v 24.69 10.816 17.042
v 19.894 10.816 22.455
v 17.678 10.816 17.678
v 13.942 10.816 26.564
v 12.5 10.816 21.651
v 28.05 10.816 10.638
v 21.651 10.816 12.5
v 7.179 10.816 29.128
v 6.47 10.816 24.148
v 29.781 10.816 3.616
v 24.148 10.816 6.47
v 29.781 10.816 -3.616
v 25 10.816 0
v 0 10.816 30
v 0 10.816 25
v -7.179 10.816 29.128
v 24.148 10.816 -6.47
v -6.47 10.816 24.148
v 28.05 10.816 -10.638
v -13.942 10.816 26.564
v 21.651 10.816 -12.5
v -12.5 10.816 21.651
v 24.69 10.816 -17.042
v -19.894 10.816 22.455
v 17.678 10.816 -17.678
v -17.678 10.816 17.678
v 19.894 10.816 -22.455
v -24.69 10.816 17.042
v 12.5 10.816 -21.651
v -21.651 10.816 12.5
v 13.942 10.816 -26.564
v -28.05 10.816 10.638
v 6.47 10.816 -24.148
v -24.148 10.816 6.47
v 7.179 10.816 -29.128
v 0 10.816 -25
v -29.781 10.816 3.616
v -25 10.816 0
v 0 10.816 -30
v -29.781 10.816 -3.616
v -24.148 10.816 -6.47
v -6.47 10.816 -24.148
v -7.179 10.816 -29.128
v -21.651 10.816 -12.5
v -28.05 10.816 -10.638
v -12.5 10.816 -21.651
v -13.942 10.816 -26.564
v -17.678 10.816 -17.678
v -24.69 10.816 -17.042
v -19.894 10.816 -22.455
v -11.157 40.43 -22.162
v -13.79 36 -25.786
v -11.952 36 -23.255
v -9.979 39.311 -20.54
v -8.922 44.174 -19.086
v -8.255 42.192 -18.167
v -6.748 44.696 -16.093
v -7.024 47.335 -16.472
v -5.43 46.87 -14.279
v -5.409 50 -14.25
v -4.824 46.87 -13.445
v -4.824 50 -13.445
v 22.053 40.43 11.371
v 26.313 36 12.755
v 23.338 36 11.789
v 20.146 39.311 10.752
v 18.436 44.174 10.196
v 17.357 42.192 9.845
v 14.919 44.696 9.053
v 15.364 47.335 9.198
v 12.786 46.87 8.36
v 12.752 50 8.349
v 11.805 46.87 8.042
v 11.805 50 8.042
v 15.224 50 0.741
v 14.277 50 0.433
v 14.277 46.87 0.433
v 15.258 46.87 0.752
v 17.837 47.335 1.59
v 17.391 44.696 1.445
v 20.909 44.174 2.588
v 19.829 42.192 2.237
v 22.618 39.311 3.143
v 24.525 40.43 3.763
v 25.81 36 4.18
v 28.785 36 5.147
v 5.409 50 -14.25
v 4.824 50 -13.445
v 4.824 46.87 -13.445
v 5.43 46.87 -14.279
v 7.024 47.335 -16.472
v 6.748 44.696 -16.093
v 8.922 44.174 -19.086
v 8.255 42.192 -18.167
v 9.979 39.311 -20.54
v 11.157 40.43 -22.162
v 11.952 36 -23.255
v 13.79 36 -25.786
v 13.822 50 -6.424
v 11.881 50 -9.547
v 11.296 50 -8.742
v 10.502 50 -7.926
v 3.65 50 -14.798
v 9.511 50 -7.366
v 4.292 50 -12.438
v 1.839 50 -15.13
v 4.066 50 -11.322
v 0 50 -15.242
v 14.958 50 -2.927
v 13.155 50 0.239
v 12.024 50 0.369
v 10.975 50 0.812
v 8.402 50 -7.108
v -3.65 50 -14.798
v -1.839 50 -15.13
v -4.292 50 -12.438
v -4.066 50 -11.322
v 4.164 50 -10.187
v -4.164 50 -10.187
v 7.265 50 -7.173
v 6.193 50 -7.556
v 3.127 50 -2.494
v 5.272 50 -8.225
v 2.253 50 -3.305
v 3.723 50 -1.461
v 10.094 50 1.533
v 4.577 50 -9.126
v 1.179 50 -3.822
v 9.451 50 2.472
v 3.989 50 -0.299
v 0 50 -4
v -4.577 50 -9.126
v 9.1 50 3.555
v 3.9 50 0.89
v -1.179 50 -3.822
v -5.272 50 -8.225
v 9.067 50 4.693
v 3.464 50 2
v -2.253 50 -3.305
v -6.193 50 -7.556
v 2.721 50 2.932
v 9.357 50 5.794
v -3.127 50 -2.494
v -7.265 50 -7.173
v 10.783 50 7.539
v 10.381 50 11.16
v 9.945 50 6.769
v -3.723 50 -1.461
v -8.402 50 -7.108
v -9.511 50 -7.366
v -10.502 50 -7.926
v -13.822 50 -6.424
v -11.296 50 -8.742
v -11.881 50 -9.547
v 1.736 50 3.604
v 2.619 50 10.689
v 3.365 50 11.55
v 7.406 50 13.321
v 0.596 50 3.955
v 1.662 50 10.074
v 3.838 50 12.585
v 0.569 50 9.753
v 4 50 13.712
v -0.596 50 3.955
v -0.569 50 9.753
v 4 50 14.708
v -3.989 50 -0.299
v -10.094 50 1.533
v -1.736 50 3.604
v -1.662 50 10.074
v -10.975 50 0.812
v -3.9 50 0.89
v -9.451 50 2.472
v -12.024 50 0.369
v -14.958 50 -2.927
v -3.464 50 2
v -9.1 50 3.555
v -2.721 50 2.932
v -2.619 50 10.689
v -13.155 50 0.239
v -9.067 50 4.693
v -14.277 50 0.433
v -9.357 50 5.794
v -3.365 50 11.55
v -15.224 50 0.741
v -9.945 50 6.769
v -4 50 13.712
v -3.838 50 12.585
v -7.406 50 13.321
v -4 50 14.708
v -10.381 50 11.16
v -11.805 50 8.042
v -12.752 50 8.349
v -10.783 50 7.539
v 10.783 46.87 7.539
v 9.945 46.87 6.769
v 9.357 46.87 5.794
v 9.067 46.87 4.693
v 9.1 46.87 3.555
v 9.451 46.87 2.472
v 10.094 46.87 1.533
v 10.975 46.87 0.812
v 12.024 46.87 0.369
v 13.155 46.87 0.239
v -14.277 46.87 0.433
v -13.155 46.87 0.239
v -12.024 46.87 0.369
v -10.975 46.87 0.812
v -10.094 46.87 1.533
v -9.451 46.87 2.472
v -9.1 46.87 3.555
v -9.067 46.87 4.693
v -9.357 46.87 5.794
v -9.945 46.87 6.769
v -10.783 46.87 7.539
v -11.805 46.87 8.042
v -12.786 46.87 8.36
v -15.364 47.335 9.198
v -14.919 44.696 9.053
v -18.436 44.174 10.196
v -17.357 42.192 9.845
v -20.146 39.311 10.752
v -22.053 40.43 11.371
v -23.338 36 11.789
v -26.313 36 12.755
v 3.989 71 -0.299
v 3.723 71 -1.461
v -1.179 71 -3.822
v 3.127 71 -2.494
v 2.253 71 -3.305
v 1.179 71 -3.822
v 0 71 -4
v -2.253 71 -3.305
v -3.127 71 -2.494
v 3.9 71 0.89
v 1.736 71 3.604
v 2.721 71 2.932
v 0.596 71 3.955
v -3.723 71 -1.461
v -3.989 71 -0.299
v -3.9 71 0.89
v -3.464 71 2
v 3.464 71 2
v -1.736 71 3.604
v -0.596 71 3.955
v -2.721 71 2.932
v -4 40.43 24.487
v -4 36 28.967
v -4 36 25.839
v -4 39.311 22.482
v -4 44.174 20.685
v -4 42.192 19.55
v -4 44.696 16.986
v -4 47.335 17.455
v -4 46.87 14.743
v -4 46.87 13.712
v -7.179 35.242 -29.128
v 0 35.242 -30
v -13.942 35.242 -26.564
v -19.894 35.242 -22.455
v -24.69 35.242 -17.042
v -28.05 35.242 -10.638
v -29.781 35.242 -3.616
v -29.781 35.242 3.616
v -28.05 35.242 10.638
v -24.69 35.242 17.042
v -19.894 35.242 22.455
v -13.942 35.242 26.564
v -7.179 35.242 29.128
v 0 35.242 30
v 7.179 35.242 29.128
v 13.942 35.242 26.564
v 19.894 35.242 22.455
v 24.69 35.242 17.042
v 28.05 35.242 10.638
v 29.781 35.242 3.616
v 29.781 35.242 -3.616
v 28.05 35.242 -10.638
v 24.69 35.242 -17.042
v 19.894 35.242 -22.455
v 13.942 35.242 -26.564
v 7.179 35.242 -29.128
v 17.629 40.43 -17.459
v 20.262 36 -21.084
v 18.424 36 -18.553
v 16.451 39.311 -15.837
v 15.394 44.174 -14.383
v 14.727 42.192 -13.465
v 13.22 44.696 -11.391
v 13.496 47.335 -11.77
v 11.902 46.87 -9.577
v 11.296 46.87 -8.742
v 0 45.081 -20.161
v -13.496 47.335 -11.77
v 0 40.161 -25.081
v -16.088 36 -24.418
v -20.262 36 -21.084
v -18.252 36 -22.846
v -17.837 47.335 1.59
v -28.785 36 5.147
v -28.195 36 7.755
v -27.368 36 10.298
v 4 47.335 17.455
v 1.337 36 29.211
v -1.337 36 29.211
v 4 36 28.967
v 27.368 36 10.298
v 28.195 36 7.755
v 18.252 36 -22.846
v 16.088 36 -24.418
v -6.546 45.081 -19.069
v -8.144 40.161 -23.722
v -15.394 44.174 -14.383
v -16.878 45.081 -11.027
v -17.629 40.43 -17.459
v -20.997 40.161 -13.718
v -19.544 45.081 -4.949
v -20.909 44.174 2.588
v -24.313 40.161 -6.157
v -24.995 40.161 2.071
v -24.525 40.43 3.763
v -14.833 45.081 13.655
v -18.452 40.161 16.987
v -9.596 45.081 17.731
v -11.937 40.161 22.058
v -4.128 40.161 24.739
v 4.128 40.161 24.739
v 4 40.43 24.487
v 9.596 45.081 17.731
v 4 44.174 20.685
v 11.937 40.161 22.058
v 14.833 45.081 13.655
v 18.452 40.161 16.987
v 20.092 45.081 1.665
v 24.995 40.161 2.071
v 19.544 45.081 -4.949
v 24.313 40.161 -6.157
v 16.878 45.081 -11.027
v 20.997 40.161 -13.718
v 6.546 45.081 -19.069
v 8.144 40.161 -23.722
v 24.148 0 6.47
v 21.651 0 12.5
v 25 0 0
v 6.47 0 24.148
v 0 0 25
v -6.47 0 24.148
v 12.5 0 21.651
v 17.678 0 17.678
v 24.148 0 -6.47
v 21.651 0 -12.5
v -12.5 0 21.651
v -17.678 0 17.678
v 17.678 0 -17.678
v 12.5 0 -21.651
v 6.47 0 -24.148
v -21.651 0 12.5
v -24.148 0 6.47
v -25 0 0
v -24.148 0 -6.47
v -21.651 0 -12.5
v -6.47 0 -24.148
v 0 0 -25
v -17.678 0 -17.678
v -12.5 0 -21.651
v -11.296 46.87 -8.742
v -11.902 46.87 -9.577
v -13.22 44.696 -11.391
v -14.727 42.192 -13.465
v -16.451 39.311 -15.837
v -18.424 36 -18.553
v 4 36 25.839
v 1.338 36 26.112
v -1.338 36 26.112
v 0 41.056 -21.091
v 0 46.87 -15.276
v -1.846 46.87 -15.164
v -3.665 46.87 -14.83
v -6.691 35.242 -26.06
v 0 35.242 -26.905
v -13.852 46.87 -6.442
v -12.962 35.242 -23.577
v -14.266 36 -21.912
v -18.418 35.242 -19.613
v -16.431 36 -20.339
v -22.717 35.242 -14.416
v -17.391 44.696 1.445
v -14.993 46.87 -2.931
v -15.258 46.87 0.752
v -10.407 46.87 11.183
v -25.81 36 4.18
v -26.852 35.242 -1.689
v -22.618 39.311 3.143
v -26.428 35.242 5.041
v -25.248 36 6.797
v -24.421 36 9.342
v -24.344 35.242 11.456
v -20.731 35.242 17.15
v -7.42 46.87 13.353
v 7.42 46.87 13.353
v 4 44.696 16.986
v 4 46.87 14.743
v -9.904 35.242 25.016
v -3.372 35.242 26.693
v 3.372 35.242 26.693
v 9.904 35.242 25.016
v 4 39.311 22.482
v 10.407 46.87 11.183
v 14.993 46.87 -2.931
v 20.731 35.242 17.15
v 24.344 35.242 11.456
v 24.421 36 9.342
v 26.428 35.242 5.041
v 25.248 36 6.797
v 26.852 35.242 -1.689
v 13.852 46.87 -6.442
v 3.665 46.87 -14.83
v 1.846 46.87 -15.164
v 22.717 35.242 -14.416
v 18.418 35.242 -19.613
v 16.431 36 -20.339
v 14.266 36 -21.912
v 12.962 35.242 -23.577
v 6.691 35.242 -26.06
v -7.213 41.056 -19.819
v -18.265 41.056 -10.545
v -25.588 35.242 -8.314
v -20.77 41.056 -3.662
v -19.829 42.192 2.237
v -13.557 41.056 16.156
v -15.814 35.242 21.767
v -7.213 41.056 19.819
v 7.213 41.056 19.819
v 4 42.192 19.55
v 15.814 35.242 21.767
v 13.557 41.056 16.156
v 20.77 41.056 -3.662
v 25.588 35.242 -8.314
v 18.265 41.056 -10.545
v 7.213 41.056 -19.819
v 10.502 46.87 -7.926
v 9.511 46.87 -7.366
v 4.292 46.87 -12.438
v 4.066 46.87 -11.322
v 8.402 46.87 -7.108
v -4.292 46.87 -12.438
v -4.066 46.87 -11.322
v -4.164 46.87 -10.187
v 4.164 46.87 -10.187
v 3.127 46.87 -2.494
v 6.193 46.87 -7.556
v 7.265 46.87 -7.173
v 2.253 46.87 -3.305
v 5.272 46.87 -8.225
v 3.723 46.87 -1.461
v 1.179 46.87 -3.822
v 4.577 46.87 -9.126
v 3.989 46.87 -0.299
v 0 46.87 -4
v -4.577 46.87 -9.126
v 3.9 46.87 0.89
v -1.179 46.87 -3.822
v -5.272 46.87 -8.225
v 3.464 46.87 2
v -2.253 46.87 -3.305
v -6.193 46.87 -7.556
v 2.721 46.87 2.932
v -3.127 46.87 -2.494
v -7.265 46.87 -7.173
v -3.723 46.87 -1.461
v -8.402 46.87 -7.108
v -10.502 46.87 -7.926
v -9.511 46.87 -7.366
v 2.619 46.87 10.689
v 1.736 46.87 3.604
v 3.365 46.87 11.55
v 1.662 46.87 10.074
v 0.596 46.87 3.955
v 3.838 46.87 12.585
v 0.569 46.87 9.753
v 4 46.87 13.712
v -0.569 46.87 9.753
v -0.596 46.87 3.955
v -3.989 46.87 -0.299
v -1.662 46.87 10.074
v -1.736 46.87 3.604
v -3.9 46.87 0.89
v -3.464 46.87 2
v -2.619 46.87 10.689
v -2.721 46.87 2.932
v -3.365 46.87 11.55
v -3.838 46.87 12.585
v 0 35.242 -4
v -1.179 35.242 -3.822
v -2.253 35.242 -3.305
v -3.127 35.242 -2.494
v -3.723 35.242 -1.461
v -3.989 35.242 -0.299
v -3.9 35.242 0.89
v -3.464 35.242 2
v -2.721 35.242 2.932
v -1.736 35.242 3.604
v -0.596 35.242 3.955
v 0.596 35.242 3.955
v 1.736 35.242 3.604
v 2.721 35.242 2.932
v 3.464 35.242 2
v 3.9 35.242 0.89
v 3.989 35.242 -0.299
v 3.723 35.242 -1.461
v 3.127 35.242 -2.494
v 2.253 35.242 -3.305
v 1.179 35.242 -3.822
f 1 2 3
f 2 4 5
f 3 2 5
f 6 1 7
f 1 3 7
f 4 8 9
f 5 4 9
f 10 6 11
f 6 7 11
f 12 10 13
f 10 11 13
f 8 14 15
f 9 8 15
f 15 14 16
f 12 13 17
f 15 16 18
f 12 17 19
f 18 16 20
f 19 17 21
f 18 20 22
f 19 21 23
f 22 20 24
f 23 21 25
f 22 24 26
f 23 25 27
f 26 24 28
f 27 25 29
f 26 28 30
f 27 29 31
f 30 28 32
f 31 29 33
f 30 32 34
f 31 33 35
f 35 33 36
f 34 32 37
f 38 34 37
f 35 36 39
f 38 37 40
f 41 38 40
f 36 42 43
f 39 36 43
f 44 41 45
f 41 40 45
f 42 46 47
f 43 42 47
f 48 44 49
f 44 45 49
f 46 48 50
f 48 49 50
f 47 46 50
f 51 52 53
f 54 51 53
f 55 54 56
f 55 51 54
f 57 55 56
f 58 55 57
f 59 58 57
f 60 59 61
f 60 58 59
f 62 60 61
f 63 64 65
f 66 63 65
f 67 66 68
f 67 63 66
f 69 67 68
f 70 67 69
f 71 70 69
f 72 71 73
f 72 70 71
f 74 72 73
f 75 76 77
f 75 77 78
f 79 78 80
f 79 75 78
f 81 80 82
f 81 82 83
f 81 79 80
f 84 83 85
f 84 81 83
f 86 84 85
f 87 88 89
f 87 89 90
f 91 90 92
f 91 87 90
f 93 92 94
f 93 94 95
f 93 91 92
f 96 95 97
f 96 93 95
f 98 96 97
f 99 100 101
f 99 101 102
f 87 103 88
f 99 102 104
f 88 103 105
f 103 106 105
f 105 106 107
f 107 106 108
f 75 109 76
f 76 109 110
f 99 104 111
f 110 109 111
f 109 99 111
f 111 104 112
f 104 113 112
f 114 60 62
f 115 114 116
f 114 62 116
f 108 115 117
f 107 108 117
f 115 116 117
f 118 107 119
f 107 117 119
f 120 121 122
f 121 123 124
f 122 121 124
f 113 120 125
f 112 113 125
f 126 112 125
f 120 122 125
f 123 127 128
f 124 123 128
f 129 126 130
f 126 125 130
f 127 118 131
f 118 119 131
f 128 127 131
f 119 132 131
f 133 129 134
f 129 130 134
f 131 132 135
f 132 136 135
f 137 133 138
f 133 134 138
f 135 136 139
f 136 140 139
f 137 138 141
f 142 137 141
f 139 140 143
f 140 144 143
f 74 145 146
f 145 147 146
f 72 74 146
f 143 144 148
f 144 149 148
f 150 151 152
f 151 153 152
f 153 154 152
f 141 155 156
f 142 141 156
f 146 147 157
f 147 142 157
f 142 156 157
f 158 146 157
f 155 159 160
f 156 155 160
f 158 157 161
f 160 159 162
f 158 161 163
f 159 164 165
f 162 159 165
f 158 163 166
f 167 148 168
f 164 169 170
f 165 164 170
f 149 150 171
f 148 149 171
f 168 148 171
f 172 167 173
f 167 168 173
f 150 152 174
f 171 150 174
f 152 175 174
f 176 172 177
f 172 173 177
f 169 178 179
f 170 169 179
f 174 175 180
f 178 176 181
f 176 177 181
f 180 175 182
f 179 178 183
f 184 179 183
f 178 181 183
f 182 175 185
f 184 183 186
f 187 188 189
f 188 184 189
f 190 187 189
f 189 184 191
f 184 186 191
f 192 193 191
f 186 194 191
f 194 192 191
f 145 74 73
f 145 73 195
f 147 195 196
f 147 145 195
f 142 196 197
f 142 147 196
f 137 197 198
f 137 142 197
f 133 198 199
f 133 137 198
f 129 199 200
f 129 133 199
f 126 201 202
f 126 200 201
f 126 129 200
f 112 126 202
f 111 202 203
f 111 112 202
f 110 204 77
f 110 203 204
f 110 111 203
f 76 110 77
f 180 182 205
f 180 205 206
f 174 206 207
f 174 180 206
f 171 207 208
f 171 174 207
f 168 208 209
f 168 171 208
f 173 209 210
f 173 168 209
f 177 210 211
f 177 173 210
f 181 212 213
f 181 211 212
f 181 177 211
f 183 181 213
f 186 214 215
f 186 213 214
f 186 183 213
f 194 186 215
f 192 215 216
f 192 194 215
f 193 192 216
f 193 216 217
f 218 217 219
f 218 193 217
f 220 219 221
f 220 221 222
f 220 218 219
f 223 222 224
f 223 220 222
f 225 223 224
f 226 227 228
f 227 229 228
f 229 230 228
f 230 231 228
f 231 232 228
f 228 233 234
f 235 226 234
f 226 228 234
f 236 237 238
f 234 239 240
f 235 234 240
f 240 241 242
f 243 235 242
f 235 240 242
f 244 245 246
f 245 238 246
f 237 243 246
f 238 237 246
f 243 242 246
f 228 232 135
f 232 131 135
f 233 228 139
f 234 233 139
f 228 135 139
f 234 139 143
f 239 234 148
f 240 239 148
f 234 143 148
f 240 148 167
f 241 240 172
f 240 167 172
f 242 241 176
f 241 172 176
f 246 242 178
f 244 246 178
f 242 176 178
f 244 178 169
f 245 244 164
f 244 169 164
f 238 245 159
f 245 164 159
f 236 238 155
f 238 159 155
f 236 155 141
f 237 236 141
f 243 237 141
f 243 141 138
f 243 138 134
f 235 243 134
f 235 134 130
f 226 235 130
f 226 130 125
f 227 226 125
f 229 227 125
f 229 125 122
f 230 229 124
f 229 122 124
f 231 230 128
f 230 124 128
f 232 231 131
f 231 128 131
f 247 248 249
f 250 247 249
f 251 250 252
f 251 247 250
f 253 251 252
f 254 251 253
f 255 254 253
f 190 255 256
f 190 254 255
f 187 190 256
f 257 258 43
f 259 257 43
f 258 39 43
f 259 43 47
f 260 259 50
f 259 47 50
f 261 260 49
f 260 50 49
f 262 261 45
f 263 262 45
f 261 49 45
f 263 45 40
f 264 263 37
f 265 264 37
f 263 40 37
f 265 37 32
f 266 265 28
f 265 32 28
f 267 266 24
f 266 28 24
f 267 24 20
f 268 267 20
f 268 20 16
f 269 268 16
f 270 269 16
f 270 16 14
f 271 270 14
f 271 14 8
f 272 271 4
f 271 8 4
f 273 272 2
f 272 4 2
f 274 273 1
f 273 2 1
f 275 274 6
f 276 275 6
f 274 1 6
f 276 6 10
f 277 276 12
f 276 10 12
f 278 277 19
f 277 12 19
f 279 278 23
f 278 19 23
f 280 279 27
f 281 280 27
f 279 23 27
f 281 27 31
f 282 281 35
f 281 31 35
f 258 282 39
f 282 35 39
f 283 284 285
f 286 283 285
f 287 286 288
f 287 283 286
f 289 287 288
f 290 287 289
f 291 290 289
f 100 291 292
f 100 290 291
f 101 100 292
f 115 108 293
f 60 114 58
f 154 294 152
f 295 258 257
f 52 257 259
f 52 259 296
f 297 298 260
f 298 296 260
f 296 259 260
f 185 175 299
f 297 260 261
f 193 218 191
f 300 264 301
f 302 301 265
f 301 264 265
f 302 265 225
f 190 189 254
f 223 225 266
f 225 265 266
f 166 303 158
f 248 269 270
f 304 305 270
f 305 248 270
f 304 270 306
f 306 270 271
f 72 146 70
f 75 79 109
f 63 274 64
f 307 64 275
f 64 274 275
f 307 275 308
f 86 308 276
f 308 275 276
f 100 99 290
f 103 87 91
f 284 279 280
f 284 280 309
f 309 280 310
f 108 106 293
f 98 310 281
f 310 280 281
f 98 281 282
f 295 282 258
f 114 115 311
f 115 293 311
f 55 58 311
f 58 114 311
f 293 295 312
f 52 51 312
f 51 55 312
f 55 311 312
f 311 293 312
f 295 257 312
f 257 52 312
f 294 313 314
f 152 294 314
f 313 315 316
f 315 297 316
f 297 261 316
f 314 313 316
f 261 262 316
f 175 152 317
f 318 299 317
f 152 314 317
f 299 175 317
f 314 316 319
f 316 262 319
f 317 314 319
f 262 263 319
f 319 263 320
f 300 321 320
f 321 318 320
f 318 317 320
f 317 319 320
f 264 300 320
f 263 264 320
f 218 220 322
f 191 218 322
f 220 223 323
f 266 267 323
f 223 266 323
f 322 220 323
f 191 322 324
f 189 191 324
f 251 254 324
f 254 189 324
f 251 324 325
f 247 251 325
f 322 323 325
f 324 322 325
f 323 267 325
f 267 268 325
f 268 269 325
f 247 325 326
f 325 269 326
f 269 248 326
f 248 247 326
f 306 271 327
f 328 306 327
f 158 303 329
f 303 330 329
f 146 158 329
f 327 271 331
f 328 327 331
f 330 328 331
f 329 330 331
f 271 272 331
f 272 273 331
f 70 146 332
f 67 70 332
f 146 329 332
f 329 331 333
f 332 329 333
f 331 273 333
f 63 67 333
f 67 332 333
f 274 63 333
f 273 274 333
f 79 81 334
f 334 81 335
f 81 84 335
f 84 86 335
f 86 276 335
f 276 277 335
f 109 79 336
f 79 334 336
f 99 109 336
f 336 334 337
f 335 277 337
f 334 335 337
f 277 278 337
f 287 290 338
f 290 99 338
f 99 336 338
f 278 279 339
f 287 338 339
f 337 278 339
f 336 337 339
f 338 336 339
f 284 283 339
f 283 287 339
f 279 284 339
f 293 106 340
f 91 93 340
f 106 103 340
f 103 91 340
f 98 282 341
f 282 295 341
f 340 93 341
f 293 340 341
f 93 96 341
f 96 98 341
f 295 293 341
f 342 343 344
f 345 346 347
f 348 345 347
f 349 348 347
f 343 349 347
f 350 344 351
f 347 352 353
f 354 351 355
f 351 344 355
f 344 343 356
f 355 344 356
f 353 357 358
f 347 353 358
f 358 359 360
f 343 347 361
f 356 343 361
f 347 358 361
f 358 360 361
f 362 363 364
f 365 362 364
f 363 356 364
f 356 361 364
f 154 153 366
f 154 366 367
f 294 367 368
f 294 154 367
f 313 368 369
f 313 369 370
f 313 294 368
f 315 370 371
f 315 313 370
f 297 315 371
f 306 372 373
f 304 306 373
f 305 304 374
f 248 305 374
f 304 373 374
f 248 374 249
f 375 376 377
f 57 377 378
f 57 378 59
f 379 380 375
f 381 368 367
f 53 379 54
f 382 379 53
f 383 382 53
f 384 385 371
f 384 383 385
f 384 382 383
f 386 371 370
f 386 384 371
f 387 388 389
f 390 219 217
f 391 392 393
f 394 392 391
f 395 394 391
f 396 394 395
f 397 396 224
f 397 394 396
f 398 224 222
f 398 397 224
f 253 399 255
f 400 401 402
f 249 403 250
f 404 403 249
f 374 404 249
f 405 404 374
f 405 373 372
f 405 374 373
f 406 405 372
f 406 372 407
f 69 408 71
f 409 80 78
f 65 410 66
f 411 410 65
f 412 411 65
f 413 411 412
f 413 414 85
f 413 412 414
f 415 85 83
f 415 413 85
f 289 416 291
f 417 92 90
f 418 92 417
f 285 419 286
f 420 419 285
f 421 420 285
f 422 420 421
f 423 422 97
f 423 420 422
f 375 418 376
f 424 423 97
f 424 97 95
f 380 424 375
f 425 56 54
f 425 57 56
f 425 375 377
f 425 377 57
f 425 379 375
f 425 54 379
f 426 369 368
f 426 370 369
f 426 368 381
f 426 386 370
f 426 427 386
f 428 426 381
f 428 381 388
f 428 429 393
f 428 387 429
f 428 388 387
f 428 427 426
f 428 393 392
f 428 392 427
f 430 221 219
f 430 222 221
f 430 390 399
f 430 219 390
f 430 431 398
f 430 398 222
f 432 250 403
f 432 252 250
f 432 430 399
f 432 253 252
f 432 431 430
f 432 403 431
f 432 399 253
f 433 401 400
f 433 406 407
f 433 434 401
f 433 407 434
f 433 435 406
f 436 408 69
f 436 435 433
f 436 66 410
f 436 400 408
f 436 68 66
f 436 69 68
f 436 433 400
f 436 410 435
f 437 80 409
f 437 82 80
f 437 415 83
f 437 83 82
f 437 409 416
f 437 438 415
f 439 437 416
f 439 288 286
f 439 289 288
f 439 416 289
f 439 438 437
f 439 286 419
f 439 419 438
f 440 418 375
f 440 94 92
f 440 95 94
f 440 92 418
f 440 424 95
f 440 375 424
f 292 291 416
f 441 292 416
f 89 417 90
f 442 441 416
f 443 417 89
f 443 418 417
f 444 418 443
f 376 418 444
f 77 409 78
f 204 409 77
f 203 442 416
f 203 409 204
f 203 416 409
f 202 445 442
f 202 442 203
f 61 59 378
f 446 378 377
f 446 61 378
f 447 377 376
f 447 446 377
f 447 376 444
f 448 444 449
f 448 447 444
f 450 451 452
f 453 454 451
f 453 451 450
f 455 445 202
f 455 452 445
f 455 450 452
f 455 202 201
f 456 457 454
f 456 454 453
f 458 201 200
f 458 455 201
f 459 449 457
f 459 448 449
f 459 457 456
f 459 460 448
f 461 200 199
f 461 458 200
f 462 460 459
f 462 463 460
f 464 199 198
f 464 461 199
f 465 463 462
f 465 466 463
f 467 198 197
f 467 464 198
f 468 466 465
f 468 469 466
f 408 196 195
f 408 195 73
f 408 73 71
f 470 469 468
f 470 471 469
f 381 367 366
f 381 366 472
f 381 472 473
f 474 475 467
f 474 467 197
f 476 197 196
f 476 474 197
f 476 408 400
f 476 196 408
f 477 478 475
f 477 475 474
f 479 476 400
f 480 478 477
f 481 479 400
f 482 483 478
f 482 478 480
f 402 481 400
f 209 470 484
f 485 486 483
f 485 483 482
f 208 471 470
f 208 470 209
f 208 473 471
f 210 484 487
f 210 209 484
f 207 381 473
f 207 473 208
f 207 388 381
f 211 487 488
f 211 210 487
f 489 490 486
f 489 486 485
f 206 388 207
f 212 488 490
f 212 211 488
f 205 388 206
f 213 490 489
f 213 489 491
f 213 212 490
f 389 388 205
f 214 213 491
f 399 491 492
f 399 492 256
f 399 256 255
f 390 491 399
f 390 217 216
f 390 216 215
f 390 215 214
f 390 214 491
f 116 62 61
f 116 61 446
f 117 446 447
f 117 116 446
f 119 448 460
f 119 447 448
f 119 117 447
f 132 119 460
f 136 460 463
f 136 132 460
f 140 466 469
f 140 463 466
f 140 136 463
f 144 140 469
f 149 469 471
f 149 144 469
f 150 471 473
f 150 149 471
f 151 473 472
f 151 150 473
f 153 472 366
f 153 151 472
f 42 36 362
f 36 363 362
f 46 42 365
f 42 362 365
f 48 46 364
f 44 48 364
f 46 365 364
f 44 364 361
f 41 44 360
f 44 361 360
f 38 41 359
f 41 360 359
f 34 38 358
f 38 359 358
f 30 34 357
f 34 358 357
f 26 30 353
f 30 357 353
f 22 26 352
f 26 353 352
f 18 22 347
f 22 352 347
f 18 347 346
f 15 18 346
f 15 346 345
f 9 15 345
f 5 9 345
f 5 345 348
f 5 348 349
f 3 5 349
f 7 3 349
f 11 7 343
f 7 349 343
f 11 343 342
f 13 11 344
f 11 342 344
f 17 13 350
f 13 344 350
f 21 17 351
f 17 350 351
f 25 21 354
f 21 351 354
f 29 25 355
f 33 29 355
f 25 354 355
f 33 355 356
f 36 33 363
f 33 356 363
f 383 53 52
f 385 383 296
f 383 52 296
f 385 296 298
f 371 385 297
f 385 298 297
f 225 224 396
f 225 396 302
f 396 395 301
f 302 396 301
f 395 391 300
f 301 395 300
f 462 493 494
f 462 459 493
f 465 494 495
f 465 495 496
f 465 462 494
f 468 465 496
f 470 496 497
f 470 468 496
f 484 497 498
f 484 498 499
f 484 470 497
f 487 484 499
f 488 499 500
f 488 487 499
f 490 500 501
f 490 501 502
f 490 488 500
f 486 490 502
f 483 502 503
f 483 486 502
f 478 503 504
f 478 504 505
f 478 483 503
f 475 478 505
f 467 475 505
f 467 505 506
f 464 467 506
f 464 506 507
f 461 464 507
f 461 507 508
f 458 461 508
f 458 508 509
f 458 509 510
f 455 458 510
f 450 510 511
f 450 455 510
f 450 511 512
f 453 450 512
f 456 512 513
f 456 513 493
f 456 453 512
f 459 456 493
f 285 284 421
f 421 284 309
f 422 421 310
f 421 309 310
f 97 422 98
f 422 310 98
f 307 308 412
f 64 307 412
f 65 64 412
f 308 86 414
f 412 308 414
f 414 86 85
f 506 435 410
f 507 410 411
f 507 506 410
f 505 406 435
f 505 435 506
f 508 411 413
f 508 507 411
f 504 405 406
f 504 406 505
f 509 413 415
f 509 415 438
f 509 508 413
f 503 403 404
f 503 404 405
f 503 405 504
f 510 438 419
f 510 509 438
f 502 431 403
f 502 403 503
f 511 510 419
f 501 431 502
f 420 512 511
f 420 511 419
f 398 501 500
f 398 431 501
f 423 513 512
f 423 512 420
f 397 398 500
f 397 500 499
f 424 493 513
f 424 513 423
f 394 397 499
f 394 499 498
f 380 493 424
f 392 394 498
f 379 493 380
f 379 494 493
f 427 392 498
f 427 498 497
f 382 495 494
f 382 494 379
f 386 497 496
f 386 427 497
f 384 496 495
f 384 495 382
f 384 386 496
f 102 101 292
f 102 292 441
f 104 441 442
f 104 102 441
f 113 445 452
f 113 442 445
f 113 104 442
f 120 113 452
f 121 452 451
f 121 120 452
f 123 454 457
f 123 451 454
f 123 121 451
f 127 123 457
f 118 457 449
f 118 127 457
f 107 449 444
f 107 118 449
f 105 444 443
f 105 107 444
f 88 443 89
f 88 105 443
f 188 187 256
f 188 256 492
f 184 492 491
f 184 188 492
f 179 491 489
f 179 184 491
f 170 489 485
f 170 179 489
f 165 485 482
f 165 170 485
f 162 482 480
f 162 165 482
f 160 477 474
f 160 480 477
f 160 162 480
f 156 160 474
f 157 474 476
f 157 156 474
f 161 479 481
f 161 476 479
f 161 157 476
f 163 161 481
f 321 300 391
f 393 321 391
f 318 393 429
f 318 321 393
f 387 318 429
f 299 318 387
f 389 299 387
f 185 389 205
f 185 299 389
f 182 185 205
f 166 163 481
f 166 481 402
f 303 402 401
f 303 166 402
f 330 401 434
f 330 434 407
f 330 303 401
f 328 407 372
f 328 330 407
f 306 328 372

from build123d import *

# Parameters (mm, degrees)
CUT_EXTRUDE1_DEPTH = 14


with BuildPart() as part:
    # Sketch1 → Revolve1 (revolve)
    with BuildSketch(Plane.XY, mode=Mode.PRIVATE) as revolve1_sk:
        Polygon((0, 0), (0, 71), (4, 71), (4, 50), (15.241746612, 50), (30, 35.241746612), (30, 10.816092816), (25, 10.816092816), (25, 0), align=None)
        Polygon((4, 46.870301593), (15.276378104, 46.870301593), (26.904933085, 35.241746612), (4, 35.241746612), align=None, mode=Mode.SUBTRACT)
    revolve(revolve1_sk.sketch.rotate(Axis((0, 0, 0), (0, 1, 0)), 90), axis=Axis((0, 0, 0), (0, 1, 0)))

    # Sketch2 → Cut-Extrude1 (cut)
    with BuildSketch(Plane(origin=(0, 50, 0), x_dir=(1, 0, 0), z_dir=(0, 1, 0))):
        with BuildLine():
            Line((4, -13.71219958), (4, -33.089481043))
            Line((4, -33.089481043), (-4, -33.089481043))
            Line((-4, -33.089481043), (-4, -13.71219958))
            ThreePointArc((-4, -13.71219958), (0, -9.71219958), (4, -13.71219958))
        make_face()
        with BuildLine():
            Line((-30.23389859, -14.029438043), (-32.706034545, -6.420985912))
            Line((-32.706034545, -6.420985912), (-14.277144741, -0.433076635))
            ThreePointArc((-14.277144741, -0.433076635), (-9.236850698, -3.001234723), (-11.805008786, -8.041528766))
            Line((-11.805008786, -8.041528766), (-30.23389859, -14.029438043))
        make_face()
        with BuildLine():
            Line((-22.685576941, 24.41881149), (-16.213440986, 29.121093508))
            Line((-16.213440986, 29.121093508), (-4.823760712, 13.4445435))
            ThreePointArc((-4.823760712, 13.4445435), (-5.708687681, 7.857334513), (-11.295896667, 8.742261481))
            Line((-11.295896667, 8.742261481), (-22.685576941, 24.41881149))
        make_face()
        with BuildLine():
            Line((16.213440986, 29.121093508), (22.685576941, 24.41881149))
            Line((22.685576941, 24.41881149), (11.295896667, 8.742261481))
            ThreePointArc((11.295896667, 8.742261481), (5.708687681, 7.857334513), (4.823760712, 13.4445435))
            Line((4.823760712, 13.4445435), (16.213440986, 29.121093508))
        make_face()
        with BuildLine():
            Line((32.706034545, -6.420985912), (30.23389859, -14.029438043))
            Line((30.23389859, -14.029438043), (11.805008786, -8.041528766))
            ThreePointArc((11.805008786, -8.041528766), (9.236850698, -3.001234723), (14.277144741, -0.433076635))
            Line((14.277144741, -0.433076635), (32.706034545, -6.420985912))
        make_face()
    extrude(amount=-CUT_EXTRUDE1_DEPTH, mode=Mode.SUBTRACT)


solid = part.part
